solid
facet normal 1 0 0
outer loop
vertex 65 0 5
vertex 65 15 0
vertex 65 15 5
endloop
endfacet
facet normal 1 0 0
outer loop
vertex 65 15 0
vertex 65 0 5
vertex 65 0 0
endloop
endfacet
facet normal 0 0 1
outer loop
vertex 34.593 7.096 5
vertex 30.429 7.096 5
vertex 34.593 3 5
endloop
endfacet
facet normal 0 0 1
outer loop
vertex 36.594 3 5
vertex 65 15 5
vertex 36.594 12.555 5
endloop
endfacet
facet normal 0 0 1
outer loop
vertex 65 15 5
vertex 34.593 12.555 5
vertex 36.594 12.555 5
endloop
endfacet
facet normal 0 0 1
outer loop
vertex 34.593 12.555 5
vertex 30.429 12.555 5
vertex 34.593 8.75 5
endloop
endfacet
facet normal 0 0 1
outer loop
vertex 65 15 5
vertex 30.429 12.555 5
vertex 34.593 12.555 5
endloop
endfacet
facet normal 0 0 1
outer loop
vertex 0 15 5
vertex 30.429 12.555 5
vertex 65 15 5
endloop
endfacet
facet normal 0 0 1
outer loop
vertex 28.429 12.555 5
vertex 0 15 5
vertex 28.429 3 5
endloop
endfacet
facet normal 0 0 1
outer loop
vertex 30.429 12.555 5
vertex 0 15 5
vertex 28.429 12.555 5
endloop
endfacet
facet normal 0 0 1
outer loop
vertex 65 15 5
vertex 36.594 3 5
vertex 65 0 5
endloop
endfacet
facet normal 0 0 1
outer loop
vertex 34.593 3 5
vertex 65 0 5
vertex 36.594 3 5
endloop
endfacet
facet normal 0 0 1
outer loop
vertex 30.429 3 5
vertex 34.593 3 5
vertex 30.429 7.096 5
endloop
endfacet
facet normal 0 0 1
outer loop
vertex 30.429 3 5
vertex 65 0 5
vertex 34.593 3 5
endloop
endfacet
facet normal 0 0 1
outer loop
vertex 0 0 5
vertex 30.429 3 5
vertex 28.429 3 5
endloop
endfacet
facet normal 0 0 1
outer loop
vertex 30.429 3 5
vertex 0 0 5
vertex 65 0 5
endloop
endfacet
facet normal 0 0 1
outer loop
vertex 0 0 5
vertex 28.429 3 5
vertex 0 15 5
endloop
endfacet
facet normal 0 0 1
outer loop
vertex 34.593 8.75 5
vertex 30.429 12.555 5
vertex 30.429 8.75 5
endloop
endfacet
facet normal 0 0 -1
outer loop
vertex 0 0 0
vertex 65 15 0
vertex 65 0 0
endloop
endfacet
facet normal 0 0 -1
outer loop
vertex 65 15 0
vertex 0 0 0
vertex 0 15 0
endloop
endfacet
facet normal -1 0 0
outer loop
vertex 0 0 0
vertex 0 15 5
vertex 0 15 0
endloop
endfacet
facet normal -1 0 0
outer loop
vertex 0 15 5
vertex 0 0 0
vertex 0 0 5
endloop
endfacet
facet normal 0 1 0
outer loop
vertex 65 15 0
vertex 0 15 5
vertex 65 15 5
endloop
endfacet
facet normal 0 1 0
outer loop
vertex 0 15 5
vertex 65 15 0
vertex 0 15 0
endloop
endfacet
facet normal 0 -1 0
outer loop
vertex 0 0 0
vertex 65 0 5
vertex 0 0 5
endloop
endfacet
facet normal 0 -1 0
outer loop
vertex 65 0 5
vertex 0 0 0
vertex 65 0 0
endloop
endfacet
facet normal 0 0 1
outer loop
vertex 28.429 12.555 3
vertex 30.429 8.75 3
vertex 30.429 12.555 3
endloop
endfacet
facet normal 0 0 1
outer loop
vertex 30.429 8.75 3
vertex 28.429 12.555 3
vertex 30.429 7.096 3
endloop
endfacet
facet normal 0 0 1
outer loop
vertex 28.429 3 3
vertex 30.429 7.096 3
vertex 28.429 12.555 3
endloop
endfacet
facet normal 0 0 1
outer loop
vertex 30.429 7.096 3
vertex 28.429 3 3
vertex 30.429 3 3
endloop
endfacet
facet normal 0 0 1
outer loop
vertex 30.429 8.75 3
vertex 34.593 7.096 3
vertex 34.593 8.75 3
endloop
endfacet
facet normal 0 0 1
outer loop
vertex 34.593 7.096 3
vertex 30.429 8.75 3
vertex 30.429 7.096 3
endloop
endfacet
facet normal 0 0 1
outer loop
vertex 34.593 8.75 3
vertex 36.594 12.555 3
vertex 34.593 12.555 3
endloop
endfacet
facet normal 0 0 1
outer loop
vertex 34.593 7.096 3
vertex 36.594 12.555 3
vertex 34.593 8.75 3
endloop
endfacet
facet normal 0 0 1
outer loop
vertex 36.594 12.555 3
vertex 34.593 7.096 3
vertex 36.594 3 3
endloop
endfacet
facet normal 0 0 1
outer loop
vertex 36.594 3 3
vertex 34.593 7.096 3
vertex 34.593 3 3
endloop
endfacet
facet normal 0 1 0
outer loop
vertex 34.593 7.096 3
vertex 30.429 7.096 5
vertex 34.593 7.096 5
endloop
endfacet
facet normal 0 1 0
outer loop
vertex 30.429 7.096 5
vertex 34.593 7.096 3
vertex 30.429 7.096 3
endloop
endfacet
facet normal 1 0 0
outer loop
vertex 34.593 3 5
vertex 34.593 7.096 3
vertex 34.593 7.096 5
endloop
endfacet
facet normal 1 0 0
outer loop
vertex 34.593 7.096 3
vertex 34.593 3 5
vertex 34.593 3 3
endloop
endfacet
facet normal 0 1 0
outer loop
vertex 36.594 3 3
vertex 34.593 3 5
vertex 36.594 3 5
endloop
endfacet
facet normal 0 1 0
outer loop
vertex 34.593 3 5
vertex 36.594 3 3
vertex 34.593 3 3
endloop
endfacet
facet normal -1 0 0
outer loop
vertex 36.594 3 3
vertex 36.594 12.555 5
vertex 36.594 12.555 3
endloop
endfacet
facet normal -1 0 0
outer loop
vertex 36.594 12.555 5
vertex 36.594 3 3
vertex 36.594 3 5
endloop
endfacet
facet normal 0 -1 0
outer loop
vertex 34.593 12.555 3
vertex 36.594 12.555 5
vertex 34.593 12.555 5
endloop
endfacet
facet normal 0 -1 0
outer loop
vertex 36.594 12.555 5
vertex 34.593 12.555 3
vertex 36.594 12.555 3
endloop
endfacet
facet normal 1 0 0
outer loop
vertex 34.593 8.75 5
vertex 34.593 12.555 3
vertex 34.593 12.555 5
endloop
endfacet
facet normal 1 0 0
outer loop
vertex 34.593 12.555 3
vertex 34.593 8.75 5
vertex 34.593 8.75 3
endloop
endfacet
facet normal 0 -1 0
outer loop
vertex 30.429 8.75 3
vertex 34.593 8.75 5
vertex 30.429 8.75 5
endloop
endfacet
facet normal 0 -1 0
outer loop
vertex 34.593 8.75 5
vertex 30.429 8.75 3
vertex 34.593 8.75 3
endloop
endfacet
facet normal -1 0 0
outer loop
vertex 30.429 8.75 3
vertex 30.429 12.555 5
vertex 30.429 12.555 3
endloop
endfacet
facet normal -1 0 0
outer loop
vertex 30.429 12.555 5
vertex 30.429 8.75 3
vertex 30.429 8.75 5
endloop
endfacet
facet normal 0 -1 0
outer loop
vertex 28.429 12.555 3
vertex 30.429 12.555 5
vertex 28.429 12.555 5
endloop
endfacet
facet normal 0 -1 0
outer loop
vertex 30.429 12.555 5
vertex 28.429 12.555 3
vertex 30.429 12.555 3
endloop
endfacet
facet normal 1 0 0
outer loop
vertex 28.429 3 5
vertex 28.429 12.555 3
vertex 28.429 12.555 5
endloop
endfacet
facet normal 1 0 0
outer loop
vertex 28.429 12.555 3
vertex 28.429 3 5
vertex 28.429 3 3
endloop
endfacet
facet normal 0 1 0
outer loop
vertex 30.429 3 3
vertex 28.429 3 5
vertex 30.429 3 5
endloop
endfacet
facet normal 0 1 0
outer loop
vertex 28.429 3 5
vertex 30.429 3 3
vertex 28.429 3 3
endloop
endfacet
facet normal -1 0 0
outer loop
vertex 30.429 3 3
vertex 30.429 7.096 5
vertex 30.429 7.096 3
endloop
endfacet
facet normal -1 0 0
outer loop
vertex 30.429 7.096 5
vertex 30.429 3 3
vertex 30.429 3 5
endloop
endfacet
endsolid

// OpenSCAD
difference(){
	union(){ 
        translate([0,0,0]){
           cube([65,15,5], center=false);
        }                
	}
	union() {
        translate([60-65/2, 3,3]){
            linear_extrude(height = 10) {
                text("H", size = 10, font="Arial:style=Bold");
            }
        }                


	}
}
